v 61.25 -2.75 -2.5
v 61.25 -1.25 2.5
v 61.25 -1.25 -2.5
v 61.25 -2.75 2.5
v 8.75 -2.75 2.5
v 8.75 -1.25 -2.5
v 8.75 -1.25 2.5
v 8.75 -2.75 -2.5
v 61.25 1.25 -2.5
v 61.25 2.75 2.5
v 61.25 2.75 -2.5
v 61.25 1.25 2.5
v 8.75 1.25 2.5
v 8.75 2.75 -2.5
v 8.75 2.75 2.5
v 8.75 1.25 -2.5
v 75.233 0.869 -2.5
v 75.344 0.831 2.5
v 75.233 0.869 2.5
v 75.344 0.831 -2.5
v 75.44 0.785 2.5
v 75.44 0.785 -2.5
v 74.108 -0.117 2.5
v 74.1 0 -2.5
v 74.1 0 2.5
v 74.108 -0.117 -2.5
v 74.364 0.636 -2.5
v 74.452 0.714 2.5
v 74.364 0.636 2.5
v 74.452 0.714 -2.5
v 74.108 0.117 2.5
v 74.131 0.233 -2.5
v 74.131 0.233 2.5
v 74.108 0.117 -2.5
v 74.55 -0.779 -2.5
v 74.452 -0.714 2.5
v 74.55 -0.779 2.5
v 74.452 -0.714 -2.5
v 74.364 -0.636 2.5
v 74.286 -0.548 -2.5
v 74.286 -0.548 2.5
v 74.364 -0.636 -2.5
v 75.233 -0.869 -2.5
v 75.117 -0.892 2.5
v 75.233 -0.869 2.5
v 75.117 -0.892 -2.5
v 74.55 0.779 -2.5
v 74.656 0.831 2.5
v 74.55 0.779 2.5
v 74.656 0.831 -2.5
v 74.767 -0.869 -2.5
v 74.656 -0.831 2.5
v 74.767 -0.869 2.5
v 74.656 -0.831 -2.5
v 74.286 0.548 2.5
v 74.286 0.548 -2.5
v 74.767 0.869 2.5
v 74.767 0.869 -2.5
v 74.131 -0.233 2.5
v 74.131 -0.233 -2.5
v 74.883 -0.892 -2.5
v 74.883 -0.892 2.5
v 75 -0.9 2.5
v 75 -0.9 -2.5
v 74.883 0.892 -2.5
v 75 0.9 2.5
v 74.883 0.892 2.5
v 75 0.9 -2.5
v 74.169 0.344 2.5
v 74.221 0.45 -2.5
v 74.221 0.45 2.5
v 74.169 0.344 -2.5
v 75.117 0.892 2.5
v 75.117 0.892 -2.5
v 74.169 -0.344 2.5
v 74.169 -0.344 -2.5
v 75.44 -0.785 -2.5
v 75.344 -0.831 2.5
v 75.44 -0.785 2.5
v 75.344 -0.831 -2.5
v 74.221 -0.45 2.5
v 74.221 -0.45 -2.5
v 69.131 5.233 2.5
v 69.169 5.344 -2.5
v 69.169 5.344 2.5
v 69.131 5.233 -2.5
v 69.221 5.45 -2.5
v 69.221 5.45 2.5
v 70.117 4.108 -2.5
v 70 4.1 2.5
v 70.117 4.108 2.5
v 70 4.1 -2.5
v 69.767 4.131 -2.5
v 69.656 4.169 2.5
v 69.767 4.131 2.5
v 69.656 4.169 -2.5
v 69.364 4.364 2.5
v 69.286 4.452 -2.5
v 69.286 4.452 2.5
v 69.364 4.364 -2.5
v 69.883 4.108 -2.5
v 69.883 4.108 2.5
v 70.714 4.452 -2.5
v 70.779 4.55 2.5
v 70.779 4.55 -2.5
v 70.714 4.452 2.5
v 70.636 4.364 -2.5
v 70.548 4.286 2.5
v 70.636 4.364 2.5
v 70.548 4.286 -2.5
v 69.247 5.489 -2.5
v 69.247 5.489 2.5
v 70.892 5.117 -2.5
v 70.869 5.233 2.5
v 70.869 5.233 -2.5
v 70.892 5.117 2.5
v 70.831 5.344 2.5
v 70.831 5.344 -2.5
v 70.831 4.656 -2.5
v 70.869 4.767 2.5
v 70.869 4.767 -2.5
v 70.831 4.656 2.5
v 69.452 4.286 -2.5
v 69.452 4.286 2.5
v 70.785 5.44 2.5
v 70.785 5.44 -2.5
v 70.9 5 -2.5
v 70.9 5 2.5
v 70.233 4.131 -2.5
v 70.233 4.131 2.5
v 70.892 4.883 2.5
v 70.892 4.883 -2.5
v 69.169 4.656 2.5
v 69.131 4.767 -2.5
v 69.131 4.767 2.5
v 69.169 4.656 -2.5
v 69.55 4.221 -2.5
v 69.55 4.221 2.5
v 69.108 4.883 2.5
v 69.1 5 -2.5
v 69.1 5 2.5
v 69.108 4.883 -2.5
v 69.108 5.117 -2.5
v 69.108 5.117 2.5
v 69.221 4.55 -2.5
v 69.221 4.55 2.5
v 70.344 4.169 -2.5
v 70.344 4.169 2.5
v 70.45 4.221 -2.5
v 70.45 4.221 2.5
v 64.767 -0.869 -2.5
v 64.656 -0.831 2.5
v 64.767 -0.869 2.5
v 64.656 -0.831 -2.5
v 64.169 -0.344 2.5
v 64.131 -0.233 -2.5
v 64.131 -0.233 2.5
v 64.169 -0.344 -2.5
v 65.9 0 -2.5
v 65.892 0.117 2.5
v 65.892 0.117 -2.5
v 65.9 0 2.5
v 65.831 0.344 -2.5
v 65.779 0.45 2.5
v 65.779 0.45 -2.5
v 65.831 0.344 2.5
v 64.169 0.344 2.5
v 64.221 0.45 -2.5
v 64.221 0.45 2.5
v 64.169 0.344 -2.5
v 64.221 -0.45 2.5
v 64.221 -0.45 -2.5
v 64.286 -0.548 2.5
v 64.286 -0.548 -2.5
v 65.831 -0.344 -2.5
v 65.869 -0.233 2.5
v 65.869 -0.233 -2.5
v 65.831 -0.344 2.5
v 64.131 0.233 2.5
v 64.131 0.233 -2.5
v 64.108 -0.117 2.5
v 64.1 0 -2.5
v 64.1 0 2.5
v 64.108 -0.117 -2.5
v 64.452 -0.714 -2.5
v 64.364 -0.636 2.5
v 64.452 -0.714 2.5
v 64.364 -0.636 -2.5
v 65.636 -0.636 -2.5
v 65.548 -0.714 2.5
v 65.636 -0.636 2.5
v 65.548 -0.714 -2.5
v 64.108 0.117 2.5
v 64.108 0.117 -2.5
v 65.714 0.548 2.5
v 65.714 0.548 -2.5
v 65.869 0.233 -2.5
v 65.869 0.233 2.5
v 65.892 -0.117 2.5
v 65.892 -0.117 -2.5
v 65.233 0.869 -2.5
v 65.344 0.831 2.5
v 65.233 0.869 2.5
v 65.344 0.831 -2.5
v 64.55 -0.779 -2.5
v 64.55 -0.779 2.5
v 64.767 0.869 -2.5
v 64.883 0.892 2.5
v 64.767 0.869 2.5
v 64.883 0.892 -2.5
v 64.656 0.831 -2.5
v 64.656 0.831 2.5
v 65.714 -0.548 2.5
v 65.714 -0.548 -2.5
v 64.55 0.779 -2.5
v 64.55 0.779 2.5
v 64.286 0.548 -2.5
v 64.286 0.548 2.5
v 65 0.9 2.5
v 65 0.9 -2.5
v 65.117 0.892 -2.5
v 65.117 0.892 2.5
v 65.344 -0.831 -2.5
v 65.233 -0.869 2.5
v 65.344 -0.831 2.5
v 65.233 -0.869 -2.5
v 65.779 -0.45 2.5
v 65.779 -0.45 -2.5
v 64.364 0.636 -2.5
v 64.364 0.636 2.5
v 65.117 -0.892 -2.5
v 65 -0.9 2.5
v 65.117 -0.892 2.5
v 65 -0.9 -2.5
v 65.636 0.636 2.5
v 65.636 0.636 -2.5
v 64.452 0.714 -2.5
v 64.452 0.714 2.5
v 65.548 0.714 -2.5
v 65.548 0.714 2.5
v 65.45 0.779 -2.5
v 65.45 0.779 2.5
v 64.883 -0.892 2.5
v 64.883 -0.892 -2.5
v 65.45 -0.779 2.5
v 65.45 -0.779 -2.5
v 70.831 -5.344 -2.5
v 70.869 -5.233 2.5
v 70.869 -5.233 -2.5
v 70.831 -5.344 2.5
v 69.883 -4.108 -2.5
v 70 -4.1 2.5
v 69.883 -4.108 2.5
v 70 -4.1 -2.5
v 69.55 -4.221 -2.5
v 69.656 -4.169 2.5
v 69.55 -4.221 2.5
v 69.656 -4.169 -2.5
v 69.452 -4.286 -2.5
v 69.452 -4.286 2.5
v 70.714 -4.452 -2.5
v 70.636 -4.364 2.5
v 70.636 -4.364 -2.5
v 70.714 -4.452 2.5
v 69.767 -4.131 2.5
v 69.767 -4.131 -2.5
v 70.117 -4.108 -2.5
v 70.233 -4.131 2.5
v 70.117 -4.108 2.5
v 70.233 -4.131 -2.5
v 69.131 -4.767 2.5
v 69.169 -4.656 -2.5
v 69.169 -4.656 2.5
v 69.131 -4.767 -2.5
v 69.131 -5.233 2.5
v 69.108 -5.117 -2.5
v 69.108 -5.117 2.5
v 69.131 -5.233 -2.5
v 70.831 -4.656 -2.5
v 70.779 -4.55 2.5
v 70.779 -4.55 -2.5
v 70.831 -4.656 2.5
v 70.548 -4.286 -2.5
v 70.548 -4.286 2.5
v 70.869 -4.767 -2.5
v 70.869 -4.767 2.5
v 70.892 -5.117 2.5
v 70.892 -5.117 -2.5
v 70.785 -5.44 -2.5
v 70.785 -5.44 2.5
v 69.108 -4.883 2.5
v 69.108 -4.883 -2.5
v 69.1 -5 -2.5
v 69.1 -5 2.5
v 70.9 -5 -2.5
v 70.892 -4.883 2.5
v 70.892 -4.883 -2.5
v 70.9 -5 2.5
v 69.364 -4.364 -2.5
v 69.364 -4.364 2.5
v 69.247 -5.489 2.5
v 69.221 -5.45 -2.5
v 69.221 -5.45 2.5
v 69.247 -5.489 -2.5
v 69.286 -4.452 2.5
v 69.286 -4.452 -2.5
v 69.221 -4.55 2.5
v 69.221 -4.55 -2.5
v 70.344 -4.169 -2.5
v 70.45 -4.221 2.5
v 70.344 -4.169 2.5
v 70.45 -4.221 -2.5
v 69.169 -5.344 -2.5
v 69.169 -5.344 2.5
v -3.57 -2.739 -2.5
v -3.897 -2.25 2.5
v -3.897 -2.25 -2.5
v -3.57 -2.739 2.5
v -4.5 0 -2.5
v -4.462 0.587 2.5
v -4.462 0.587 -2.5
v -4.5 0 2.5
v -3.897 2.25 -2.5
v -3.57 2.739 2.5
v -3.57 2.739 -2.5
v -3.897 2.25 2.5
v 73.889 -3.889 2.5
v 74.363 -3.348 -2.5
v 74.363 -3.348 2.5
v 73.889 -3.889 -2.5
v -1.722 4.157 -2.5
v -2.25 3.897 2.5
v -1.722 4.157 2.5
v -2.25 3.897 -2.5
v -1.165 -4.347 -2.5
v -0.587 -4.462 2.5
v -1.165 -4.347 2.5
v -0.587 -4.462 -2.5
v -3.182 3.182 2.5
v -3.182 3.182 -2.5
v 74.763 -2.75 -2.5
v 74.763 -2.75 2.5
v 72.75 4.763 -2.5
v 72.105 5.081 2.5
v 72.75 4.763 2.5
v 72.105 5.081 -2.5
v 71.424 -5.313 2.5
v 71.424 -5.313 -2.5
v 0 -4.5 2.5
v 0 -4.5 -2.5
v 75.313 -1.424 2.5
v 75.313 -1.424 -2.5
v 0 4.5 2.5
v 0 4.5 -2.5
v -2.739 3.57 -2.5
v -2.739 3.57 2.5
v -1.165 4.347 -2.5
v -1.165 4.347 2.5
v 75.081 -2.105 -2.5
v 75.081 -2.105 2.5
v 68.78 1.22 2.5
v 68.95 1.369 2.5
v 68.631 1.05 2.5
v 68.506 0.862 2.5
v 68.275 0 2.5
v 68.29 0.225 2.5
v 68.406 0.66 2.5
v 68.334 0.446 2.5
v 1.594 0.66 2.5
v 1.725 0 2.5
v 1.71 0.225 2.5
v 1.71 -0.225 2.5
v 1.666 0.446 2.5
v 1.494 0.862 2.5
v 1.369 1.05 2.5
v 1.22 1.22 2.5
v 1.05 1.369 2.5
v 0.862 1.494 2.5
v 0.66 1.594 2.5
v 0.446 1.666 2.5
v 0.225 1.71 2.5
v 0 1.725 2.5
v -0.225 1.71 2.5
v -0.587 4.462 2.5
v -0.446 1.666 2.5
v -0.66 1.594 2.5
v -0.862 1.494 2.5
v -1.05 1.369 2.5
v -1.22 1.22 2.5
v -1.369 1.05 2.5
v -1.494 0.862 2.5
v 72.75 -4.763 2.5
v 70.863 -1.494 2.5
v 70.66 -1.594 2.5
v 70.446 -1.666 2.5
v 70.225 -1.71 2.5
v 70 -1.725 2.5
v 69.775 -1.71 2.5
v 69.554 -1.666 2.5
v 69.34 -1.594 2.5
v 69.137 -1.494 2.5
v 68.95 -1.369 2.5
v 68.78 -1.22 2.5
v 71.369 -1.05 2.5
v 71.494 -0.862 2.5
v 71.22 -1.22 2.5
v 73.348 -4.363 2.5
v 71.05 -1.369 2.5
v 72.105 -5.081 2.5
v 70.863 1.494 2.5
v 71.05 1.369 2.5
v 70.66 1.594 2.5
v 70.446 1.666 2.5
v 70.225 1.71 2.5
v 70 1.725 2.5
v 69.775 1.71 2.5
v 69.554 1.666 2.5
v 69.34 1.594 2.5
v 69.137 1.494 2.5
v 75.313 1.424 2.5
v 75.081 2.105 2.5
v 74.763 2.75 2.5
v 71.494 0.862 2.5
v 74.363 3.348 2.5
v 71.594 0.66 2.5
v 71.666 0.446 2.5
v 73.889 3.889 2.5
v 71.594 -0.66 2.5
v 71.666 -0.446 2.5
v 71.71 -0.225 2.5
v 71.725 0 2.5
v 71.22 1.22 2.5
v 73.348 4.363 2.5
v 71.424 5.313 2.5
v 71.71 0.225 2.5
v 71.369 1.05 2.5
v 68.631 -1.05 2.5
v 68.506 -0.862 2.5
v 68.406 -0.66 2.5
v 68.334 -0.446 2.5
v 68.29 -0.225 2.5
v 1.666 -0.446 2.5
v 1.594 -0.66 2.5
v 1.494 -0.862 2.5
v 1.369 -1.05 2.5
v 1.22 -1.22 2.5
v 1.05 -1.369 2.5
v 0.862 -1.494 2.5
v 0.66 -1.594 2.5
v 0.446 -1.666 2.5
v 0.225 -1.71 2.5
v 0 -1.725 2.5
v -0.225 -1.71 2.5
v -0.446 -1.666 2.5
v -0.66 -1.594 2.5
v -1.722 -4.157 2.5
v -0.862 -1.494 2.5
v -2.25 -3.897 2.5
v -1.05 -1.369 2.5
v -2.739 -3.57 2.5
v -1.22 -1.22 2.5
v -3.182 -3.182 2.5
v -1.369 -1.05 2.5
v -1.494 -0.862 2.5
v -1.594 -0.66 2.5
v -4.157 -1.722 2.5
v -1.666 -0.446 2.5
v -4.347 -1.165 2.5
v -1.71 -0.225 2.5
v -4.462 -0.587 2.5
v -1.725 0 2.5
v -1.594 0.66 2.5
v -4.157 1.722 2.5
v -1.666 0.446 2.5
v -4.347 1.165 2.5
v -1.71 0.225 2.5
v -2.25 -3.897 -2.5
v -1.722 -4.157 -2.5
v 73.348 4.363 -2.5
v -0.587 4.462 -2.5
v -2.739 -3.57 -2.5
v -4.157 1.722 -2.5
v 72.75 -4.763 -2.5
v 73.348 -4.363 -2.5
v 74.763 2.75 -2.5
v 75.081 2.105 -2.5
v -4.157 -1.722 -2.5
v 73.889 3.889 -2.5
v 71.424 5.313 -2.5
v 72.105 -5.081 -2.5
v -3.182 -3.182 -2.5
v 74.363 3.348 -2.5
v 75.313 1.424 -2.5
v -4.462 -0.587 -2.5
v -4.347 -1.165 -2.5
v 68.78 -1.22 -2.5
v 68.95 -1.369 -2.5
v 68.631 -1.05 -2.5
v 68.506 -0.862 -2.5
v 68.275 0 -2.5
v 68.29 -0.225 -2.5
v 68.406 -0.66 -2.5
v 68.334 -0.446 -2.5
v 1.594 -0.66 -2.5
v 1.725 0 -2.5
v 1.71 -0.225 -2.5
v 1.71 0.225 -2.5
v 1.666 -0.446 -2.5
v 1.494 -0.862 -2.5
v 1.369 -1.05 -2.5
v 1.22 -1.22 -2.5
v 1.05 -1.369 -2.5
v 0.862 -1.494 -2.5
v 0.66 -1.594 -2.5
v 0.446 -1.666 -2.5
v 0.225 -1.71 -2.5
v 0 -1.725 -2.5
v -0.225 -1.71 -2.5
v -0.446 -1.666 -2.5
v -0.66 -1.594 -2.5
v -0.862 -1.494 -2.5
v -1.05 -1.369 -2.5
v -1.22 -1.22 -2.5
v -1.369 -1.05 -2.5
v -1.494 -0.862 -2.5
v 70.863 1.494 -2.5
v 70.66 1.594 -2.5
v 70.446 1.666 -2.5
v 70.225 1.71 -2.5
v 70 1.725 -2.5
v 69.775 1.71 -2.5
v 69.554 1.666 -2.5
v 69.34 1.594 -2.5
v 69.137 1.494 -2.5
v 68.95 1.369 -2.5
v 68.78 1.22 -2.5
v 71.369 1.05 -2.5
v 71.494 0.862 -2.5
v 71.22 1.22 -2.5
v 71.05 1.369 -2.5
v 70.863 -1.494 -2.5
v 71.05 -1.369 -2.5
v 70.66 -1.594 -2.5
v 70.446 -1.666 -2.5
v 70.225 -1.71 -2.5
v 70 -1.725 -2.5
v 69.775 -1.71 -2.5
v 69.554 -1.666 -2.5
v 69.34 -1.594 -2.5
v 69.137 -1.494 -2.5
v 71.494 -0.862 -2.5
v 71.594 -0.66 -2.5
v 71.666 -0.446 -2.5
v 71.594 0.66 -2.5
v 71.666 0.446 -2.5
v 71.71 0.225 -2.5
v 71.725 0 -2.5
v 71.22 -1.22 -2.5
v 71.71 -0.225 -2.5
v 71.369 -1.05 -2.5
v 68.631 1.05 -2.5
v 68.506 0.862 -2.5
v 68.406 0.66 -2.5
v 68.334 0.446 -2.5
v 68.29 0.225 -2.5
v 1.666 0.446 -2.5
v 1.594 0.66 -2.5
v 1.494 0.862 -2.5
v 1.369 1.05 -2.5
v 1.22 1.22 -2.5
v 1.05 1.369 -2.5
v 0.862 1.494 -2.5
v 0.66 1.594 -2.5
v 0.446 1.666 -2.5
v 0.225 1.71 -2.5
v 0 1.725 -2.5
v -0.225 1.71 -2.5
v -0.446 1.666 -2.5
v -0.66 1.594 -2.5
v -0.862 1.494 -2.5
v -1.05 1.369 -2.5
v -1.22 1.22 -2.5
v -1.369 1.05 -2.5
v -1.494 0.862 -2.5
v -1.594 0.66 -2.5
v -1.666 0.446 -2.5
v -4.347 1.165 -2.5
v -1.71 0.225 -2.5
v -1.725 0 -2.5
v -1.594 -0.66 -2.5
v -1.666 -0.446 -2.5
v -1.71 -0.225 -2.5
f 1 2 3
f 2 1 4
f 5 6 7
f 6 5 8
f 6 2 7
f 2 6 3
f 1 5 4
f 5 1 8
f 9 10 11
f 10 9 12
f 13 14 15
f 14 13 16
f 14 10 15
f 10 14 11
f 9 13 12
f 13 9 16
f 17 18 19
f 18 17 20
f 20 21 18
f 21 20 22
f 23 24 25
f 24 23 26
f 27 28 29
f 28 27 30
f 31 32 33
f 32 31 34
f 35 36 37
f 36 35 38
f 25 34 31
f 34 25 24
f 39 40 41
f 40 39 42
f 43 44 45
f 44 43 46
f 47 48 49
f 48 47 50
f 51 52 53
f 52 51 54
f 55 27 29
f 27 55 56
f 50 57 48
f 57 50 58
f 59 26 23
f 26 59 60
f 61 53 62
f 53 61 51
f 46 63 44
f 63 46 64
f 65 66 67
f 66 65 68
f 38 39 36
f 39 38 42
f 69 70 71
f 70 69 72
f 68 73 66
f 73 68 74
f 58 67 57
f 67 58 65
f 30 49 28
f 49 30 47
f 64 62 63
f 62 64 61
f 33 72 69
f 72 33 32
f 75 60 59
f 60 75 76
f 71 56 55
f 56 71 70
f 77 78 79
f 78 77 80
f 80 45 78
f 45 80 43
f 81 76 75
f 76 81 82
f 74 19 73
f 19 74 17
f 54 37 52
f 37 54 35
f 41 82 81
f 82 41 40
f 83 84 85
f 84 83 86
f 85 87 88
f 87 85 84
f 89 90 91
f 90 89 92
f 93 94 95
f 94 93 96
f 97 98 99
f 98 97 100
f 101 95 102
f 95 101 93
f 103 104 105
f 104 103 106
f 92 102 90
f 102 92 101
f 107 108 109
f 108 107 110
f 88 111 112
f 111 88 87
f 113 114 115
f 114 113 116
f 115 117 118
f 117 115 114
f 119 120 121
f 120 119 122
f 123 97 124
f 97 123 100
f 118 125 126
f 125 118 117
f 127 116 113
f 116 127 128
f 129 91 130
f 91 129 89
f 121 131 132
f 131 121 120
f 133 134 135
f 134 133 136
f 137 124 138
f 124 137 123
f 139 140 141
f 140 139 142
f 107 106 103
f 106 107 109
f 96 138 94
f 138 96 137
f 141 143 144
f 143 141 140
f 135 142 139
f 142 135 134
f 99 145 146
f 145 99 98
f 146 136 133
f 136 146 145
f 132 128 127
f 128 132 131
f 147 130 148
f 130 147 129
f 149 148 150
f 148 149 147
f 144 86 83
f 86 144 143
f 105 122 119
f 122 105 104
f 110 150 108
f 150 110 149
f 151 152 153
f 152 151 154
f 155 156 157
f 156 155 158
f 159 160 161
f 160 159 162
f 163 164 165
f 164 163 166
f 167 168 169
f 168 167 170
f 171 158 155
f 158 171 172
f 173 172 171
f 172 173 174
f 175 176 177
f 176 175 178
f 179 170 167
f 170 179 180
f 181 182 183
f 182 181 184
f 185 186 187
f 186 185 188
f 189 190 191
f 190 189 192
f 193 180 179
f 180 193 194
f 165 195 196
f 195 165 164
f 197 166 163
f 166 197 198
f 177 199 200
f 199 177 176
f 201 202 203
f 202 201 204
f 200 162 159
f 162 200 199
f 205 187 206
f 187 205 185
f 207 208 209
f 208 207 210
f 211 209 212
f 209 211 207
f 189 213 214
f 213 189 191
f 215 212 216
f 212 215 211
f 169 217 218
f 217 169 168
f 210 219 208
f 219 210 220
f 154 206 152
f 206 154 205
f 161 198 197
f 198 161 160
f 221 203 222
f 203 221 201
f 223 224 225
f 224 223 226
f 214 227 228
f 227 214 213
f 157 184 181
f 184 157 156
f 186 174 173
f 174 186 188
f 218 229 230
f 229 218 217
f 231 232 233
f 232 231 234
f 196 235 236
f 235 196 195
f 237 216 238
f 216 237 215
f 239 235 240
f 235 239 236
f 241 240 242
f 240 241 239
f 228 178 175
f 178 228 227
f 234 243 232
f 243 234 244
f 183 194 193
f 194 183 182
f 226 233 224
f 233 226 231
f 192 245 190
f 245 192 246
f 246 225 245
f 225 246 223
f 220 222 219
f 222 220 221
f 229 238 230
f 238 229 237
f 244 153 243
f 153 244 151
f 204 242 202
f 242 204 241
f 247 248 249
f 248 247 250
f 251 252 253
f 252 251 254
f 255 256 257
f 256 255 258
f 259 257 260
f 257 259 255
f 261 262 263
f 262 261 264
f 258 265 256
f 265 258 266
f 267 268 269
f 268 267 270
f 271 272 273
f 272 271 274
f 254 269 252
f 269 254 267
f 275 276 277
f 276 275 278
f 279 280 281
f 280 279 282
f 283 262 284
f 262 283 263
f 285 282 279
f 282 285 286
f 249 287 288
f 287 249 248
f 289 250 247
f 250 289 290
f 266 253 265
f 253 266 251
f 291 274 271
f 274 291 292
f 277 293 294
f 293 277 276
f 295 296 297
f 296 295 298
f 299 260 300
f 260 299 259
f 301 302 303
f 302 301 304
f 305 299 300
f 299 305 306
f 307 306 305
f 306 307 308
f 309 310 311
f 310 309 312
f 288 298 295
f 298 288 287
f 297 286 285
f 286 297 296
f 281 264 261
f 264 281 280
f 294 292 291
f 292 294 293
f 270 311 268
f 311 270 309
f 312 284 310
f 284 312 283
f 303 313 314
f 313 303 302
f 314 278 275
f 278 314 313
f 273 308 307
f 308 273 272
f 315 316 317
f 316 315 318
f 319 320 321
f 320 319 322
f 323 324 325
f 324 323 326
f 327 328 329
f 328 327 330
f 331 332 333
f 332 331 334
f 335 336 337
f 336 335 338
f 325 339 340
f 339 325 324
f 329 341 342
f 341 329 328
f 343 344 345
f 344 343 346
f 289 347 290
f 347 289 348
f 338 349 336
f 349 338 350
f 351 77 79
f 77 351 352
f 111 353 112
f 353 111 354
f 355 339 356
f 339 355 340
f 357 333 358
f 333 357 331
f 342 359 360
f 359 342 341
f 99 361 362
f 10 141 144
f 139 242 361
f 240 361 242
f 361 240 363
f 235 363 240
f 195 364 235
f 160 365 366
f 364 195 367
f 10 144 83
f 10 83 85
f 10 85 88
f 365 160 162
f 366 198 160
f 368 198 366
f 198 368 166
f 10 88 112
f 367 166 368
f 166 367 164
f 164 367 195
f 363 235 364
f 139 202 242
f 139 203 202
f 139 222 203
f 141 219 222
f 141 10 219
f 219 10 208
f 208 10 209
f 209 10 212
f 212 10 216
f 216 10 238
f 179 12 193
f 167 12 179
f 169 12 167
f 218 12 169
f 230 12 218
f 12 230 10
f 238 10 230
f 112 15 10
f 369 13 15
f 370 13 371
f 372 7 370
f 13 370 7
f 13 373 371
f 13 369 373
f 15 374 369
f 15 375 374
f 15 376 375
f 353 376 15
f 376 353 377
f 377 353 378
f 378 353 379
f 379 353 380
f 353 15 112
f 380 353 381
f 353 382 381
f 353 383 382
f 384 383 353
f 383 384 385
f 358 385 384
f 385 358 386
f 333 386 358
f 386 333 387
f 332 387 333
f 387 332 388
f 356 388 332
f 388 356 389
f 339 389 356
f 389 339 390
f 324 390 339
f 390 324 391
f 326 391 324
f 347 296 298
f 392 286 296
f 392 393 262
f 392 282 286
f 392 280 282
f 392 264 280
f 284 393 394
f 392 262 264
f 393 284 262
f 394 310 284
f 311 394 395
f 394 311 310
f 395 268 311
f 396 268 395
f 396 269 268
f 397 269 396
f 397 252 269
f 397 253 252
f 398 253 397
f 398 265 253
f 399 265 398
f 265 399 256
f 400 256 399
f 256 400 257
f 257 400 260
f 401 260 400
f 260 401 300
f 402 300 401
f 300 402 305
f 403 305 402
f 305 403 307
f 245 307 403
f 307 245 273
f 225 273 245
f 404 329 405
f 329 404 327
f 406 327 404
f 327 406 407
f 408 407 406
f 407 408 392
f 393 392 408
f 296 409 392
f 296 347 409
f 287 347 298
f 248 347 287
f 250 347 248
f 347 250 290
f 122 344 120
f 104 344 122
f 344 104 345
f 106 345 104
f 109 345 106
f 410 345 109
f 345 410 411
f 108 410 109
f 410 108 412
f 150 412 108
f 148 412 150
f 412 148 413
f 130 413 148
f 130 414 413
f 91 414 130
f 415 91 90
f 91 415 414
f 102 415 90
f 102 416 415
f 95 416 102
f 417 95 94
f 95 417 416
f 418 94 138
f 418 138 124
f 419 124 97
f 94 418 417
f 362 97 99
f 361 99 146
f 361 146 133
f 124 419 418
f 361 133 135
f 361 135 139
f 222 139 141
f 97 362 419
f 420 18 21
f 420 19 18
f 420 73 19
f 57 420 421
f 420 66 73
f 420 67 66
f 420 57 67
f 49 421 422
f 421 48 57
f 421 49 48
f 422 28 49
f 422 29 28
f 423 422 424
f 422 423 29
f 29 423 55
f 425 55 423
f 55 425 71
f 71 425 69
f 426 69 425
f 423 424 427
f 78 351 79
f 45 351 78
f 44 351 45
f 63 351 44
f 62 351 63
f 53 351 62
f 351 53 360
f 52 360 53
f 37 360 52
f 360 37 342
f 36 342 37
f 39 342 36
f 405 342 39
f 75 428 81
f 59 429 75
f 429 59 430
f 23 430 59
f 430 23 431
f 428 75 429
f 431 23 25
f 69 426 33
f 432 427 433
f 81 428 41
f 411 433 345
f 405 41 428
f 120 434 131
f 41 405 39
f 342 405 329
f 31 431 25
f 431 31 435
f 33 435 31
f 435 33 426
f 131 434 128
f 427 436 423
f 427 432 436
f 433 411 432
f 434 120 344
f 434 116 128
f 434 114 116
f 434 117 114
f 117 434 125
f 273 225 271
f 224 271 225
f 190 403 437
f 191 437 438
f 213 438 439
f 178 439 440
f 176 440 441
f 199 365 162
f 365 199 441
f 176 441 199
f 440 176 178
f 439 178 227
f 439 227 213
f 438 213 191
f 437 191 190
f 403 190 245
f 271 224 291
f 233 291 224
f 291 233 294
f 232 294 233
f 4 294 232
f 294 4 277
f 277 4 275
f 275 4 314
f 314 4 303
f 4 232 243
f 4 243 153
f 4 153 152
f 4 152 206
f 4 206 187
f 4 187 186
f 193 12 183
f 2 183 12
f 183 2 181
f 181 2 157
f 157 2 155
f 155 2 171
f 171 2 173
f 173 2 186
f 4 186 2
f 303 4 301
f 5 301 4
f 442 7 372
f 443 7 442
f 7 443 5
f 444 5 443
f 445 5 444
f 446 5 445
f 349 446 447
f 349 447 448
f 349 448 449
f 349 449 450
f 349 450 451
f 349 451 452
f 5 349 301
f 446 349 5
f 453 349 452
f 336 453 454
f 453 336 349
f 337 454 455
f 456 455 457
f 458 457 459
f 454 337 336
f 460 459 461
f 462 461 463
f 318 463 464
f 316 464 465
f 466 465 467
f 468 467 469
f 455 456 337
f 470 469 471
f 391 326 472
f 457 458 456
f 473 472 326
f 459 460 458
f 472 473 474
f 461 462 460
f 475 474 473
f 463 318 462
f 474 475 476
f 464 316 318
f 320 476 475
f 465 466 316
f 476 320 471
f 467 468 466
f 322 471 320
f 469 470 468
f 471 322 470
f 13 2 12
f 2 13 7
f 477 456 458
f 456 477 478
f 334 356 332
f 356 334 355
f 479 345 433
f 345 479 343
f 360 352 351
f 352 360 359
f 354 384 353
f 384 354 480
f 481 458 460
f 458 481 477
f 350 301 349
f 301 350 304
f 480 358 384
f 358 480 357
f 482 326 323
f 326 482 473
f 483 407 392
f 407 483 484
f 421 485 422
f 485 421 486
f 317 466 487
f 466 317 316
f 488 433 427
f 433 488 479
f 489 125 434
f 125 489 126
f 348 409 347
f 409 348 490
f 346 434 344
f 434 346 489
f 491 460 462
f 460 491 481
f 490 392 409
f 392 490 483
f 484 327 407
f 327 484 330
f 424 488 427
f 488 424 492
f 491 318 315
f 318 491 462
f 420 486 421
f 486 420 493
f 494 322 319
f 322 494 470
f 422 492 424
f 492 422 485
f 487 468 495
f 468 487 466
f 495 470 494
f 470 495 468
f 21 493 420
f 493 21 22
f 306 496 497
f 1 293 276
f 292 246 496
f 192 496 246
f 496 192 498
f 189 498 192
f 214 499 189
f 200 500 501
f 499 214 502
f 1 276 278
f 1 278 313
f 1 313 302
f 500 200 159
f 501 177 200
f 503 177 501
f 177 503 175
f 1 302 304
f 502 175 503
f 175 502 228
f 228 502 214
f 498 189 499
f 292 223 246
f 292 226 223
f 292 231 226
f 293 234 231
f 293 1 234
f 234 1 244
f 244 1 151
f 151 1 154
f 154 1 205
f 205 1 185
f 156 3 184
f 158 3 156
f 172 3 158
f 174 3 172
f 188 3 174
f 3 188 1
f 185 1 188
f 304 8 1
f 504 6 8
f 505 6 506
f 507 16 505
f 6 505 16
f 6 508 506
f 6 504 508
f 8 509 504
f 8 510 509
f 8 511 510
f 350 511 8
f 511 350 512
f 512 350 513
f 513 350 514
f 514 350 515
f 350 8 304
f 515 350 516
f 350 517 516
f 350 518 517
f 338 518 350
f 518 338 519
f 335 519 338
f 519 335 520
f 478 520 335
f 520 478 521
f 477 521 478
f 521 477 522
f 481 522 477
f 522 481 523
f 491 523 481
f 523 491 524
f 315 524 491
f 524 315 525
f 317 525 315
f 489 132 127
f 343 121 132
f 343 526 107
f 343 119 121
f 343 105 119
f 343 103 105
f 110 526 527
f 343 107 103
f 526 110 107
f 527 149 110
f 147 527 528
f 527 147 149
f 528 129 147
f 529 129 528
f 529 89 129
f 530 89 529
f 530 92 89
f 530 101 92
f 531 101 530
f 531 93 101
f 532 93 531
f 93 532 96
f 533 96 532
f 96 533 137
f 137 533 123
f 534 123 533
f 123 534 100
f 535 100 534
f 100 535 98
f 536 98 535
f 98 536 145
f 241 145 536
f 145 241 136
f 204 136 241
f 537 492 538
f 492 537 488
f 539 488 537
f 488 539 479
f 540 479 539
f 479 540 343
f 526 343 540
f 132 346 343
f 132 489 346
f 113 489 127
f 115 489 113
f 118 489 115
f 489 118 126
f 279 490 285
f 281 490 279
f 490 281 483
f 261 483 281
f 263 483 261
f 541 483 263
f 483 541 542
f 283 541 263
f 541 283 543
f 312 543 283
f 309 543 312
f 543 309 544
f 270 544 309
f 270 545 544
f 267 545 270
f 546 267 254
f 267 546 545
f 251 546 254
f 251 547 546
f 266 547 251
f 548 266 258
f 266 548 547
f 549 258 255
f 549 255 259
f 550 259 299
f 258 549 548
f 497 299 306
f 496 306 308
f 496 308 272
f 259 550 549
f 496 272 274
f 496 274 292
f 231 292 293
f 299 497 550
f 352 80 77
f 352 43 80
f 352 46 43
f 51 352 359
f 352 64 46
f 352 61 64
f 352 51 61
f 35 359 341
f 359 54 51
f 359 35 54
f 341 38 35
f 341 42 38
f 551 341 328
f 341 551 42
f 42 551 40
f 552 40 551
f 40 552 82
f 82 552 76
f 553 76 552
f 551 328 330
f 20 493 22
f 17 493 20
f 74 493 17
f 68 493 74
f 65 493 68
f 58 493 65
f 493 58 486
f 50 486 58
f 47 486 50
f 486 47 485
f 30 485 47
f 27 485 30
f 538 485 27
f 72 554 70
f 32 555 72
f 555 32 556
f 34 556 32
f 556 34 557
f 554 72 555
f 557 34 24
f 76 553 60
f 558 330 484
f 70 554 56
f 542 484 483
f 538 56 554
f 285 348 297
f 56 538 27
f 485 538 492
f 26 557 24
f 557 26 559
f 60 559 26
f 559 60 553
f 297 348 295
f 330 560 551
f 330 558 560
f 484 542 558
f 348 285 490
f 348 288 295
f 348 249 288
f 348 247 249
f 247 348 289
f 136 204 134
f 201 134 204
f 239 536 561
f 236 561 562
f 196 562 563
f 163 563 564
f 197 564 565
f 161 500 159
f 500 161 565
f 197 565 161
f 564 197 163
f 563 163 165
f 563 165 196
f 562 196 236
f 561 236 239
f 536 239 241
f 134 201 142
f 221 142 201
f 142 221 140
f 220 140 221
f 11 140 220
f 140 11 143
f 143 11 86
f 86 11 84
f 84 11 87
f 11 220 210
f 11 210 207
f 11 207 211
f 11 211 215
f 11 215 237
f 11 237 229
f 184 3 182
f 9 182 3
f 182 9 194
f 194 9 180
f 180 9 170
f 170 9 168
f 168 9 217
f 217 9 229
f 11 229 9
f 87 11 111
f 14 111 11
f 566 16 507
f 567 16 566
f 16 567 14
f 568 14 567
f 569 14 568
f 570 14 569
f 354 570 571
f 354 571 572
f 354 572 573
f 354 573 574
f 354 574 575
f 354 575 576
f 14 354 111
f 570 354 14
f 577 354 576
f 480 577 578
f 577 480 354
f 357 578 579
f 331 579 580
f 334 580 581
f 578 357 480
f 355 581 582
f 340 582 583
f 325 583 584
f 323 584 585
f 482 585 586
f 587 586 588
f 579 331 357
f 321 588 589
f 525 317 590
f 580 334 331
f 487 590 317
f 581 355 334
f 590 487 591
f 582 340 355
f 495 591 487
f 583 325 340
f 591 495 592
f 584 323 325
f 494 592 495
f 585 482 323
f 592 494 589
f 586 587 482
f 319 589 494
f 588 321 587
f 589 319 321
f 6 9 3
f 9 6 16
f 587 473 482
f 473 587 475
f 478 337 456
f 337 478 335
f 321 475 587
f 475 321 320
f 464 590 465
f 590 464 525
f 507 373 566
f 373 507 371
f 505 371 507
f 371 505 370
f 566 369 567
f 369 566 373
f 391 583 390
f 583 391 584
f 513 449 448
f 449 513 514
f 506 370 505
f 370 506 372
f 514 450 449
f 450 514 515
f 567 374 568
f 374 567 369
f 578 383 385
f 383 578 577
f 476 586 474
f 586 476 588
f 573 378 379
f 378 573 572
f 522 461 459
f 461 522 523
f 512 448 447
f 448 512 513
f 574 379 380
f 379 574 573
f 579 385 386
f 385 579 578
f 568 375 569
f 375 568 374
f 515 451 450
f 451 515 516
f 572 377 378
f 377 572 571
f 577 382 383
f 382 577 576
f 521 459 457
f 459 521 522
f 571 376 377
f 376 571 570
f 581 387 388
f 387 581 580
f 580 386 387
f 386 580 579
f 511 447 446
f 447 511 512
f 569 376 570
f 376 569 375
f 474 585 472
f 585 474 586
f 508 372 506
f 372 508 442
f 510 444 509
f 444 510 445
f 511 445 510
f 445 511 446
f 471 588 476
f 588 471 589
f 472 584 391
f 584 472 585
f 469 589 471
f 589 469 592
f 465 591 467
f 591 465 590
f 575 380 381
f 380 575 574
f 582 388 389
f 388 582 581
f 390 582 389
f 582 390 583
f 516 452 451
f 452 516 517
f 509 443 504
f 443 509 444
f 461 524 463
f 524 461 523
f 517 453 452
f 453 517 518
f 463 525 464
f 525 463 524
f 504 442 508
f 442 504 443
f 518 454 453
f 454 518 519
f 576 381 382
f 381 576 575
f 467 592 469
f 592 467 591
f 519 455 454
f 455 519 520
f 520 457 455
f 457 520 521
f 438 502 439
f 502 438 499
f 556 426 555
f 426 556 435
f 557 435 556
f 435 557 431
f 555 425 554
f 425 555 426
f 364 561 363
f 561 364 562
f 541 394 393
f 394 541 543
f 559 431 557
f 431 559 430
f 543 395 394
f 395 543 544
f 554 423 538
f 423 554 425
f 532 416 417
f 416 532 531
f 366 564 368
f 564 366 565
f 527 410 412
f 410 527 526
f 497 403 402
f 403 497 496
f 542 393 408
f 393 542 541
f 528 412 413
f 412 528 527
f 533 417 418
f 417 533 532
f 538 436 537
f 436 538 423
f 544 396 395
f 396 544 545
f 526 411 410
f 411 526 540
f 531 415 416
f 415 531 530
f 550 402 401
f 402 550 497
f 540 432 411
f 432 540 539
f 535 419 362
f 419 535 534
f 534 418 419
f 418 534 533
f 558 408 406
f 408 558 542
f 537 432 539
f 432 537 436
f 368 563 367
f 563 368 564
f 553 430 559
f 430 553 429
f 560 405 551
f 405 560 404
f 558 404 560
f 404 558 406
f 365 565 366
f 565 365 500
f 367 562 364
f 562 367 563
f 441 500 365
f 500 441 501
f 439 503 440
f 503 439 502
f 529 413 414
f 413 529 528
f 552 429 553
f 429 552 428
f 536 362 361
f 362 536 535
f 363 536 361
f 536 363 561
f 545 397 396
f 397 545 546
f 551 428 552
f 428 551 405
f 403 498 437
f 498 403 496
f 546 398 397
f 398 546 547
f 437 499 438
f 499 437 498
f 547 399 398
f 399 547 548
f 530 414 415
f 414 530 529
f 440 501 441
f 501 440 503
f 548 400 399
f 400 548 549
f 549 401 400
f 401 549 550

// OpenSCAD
// file: ../params.scad
// Vexamicus T0/T1 parametric dimensions (mm)
// Inspired by published Salto-class proportions — original geometry, not a CAD clone.

/* [Scale] */
// Overall linear scale vs nominal T1 (1.0 ≈ 240 mm body height class)
SCALE = 1.0;

/* [Body] */
BODY_W = 42 * SCALE;      // Y width
BODY_H = 38 * SCALE;      // Z height of core block
BODY_L = 55 * SCALE;      // X length
WALL = 2.4 * SCALE;
BATTERY_L = 48 * SCALE;
BATTERY_W = 18 * SCALE;
BATTERY_H = 14 * SCALE;

/* [Leg 4-bar] */
HIP_Z = -8 * SCALE;                 // hip joint below body center
FEMUR_L = 55 * SCALE;               // hip → knee
SHIN_L = 70 * SCALE;                // knee → foot
COUPLER_L = 48 * SCALE;             // parallel coupler
CRANK_L = 18 * SCALE;               // SEA output crank
LEG_THICK = 5 * SCALE;
LEG_WIDTH = 8 * SCALE;
BEARING_ID = 3.2;                   // M3 clearance
BEARING_OD = 10.0;                  // 623-ish pocket (simplified)

/* [Foot] */
TOE_R = 12 * SCALE;
ANKLE_PAD_H = 6 * SCALE;

/* [SEA hub] */
SEA_HUB_R = 16 * SCALE;
SEA_HUB_H = 12 * SCALE;
MOTOR_BORE = 5.2;                   // typical BLDC shaft
SPRING_SLOT_W = 4.5 * SCALE;

/* [Tail / reaction wheel] */
TAIL_BOOM_L = 35 * SCALE;
TAIL_WHEEL_R = 28 * SCALE;
TAIL_WHEEL_H = 8 * SCALE;
TAIL_SHAFT = 3.2;

/* [Thruster booms T2] */
THRUST_BOOM_L = 45 * SCALE;
THRUST_ARM_ROLL = 40 * SCALE;       // ~ half of Salto 80mm moment arm at SCALE~1
THRUST_MOTOR_R = 6 * SCALE;

/* [Clearance / print] */
CLEAR = 0.25;
$fn = 48;

function mm(x) = x;
// file: ../vitamins.scad
// Shared primitives
include <params.scad>

module round_rect(size, r=1.5, center=false) {
    // size = [x,y,z]
    x=size[0]; y=size[1]; z=size[2];
    translate(center ? [-x/2,-y/2,-z/2] : [0,0,0])
    minkowski() {
        cube([max(0.01,x-2*r), max(0.01,y-2*r), max(0.01,z)], center=false);
        cylinder(r=r, h=0.01, center=false);
    }
}

module bearing_pocket(h=LEG_THICK+0.2) {
    cylinder(d=BEARING_OD + CLEAR, h=h, center=true);
}

module bolt_hole(d=BEARING_ID, h=40) {
    cylinder(d=d + CLEAR, h=h, center=true);
}

module carbon_tube(L=50, od=4, id=3) {
    difference() {
        cylinder(d=od, h=L, center=true);
        cylinder(d=id, h=L+1, center=true);
    }
}

module motor_standoff_pattern(spacing=16, h=6, d=2.2) {
    for (a=[0:90:270])
        rotate([0,0,a]) translate([spacing/2,0,0])
            cylinder(d=d, h=h, center=true);
}
// main file
// Shin link (knee → foot)
include <../vitamins.scad>

module shin() {
    L = SHIN_L;
    difference() {
        hull() {
            cylinder(d=LEG_WIDTH+1, h=LEG_THICK, center=true);
            translate([L,0,0]) cylinder(d=LEG_WIDTH+3, h=LEG_THICK, center=true);
        }
        for (s=[-1,1])
            translate([L/2, s*2.0, 0])
                cube([L*0.75, 1.5, LEG_THICK+1], center=true);
        bolt_hole();
        translate([L,0,0]) bolt_hole(d=BEARING_ID);
        // foot mount face flats
        translate([L, 0, 0])
            for (a=[0:90:270]) rotate([0,0,a]) translate([5,0,0])
                cylinder(d=1.8, h=LEG_THICK+1, center=true);
    }
}

shin();
